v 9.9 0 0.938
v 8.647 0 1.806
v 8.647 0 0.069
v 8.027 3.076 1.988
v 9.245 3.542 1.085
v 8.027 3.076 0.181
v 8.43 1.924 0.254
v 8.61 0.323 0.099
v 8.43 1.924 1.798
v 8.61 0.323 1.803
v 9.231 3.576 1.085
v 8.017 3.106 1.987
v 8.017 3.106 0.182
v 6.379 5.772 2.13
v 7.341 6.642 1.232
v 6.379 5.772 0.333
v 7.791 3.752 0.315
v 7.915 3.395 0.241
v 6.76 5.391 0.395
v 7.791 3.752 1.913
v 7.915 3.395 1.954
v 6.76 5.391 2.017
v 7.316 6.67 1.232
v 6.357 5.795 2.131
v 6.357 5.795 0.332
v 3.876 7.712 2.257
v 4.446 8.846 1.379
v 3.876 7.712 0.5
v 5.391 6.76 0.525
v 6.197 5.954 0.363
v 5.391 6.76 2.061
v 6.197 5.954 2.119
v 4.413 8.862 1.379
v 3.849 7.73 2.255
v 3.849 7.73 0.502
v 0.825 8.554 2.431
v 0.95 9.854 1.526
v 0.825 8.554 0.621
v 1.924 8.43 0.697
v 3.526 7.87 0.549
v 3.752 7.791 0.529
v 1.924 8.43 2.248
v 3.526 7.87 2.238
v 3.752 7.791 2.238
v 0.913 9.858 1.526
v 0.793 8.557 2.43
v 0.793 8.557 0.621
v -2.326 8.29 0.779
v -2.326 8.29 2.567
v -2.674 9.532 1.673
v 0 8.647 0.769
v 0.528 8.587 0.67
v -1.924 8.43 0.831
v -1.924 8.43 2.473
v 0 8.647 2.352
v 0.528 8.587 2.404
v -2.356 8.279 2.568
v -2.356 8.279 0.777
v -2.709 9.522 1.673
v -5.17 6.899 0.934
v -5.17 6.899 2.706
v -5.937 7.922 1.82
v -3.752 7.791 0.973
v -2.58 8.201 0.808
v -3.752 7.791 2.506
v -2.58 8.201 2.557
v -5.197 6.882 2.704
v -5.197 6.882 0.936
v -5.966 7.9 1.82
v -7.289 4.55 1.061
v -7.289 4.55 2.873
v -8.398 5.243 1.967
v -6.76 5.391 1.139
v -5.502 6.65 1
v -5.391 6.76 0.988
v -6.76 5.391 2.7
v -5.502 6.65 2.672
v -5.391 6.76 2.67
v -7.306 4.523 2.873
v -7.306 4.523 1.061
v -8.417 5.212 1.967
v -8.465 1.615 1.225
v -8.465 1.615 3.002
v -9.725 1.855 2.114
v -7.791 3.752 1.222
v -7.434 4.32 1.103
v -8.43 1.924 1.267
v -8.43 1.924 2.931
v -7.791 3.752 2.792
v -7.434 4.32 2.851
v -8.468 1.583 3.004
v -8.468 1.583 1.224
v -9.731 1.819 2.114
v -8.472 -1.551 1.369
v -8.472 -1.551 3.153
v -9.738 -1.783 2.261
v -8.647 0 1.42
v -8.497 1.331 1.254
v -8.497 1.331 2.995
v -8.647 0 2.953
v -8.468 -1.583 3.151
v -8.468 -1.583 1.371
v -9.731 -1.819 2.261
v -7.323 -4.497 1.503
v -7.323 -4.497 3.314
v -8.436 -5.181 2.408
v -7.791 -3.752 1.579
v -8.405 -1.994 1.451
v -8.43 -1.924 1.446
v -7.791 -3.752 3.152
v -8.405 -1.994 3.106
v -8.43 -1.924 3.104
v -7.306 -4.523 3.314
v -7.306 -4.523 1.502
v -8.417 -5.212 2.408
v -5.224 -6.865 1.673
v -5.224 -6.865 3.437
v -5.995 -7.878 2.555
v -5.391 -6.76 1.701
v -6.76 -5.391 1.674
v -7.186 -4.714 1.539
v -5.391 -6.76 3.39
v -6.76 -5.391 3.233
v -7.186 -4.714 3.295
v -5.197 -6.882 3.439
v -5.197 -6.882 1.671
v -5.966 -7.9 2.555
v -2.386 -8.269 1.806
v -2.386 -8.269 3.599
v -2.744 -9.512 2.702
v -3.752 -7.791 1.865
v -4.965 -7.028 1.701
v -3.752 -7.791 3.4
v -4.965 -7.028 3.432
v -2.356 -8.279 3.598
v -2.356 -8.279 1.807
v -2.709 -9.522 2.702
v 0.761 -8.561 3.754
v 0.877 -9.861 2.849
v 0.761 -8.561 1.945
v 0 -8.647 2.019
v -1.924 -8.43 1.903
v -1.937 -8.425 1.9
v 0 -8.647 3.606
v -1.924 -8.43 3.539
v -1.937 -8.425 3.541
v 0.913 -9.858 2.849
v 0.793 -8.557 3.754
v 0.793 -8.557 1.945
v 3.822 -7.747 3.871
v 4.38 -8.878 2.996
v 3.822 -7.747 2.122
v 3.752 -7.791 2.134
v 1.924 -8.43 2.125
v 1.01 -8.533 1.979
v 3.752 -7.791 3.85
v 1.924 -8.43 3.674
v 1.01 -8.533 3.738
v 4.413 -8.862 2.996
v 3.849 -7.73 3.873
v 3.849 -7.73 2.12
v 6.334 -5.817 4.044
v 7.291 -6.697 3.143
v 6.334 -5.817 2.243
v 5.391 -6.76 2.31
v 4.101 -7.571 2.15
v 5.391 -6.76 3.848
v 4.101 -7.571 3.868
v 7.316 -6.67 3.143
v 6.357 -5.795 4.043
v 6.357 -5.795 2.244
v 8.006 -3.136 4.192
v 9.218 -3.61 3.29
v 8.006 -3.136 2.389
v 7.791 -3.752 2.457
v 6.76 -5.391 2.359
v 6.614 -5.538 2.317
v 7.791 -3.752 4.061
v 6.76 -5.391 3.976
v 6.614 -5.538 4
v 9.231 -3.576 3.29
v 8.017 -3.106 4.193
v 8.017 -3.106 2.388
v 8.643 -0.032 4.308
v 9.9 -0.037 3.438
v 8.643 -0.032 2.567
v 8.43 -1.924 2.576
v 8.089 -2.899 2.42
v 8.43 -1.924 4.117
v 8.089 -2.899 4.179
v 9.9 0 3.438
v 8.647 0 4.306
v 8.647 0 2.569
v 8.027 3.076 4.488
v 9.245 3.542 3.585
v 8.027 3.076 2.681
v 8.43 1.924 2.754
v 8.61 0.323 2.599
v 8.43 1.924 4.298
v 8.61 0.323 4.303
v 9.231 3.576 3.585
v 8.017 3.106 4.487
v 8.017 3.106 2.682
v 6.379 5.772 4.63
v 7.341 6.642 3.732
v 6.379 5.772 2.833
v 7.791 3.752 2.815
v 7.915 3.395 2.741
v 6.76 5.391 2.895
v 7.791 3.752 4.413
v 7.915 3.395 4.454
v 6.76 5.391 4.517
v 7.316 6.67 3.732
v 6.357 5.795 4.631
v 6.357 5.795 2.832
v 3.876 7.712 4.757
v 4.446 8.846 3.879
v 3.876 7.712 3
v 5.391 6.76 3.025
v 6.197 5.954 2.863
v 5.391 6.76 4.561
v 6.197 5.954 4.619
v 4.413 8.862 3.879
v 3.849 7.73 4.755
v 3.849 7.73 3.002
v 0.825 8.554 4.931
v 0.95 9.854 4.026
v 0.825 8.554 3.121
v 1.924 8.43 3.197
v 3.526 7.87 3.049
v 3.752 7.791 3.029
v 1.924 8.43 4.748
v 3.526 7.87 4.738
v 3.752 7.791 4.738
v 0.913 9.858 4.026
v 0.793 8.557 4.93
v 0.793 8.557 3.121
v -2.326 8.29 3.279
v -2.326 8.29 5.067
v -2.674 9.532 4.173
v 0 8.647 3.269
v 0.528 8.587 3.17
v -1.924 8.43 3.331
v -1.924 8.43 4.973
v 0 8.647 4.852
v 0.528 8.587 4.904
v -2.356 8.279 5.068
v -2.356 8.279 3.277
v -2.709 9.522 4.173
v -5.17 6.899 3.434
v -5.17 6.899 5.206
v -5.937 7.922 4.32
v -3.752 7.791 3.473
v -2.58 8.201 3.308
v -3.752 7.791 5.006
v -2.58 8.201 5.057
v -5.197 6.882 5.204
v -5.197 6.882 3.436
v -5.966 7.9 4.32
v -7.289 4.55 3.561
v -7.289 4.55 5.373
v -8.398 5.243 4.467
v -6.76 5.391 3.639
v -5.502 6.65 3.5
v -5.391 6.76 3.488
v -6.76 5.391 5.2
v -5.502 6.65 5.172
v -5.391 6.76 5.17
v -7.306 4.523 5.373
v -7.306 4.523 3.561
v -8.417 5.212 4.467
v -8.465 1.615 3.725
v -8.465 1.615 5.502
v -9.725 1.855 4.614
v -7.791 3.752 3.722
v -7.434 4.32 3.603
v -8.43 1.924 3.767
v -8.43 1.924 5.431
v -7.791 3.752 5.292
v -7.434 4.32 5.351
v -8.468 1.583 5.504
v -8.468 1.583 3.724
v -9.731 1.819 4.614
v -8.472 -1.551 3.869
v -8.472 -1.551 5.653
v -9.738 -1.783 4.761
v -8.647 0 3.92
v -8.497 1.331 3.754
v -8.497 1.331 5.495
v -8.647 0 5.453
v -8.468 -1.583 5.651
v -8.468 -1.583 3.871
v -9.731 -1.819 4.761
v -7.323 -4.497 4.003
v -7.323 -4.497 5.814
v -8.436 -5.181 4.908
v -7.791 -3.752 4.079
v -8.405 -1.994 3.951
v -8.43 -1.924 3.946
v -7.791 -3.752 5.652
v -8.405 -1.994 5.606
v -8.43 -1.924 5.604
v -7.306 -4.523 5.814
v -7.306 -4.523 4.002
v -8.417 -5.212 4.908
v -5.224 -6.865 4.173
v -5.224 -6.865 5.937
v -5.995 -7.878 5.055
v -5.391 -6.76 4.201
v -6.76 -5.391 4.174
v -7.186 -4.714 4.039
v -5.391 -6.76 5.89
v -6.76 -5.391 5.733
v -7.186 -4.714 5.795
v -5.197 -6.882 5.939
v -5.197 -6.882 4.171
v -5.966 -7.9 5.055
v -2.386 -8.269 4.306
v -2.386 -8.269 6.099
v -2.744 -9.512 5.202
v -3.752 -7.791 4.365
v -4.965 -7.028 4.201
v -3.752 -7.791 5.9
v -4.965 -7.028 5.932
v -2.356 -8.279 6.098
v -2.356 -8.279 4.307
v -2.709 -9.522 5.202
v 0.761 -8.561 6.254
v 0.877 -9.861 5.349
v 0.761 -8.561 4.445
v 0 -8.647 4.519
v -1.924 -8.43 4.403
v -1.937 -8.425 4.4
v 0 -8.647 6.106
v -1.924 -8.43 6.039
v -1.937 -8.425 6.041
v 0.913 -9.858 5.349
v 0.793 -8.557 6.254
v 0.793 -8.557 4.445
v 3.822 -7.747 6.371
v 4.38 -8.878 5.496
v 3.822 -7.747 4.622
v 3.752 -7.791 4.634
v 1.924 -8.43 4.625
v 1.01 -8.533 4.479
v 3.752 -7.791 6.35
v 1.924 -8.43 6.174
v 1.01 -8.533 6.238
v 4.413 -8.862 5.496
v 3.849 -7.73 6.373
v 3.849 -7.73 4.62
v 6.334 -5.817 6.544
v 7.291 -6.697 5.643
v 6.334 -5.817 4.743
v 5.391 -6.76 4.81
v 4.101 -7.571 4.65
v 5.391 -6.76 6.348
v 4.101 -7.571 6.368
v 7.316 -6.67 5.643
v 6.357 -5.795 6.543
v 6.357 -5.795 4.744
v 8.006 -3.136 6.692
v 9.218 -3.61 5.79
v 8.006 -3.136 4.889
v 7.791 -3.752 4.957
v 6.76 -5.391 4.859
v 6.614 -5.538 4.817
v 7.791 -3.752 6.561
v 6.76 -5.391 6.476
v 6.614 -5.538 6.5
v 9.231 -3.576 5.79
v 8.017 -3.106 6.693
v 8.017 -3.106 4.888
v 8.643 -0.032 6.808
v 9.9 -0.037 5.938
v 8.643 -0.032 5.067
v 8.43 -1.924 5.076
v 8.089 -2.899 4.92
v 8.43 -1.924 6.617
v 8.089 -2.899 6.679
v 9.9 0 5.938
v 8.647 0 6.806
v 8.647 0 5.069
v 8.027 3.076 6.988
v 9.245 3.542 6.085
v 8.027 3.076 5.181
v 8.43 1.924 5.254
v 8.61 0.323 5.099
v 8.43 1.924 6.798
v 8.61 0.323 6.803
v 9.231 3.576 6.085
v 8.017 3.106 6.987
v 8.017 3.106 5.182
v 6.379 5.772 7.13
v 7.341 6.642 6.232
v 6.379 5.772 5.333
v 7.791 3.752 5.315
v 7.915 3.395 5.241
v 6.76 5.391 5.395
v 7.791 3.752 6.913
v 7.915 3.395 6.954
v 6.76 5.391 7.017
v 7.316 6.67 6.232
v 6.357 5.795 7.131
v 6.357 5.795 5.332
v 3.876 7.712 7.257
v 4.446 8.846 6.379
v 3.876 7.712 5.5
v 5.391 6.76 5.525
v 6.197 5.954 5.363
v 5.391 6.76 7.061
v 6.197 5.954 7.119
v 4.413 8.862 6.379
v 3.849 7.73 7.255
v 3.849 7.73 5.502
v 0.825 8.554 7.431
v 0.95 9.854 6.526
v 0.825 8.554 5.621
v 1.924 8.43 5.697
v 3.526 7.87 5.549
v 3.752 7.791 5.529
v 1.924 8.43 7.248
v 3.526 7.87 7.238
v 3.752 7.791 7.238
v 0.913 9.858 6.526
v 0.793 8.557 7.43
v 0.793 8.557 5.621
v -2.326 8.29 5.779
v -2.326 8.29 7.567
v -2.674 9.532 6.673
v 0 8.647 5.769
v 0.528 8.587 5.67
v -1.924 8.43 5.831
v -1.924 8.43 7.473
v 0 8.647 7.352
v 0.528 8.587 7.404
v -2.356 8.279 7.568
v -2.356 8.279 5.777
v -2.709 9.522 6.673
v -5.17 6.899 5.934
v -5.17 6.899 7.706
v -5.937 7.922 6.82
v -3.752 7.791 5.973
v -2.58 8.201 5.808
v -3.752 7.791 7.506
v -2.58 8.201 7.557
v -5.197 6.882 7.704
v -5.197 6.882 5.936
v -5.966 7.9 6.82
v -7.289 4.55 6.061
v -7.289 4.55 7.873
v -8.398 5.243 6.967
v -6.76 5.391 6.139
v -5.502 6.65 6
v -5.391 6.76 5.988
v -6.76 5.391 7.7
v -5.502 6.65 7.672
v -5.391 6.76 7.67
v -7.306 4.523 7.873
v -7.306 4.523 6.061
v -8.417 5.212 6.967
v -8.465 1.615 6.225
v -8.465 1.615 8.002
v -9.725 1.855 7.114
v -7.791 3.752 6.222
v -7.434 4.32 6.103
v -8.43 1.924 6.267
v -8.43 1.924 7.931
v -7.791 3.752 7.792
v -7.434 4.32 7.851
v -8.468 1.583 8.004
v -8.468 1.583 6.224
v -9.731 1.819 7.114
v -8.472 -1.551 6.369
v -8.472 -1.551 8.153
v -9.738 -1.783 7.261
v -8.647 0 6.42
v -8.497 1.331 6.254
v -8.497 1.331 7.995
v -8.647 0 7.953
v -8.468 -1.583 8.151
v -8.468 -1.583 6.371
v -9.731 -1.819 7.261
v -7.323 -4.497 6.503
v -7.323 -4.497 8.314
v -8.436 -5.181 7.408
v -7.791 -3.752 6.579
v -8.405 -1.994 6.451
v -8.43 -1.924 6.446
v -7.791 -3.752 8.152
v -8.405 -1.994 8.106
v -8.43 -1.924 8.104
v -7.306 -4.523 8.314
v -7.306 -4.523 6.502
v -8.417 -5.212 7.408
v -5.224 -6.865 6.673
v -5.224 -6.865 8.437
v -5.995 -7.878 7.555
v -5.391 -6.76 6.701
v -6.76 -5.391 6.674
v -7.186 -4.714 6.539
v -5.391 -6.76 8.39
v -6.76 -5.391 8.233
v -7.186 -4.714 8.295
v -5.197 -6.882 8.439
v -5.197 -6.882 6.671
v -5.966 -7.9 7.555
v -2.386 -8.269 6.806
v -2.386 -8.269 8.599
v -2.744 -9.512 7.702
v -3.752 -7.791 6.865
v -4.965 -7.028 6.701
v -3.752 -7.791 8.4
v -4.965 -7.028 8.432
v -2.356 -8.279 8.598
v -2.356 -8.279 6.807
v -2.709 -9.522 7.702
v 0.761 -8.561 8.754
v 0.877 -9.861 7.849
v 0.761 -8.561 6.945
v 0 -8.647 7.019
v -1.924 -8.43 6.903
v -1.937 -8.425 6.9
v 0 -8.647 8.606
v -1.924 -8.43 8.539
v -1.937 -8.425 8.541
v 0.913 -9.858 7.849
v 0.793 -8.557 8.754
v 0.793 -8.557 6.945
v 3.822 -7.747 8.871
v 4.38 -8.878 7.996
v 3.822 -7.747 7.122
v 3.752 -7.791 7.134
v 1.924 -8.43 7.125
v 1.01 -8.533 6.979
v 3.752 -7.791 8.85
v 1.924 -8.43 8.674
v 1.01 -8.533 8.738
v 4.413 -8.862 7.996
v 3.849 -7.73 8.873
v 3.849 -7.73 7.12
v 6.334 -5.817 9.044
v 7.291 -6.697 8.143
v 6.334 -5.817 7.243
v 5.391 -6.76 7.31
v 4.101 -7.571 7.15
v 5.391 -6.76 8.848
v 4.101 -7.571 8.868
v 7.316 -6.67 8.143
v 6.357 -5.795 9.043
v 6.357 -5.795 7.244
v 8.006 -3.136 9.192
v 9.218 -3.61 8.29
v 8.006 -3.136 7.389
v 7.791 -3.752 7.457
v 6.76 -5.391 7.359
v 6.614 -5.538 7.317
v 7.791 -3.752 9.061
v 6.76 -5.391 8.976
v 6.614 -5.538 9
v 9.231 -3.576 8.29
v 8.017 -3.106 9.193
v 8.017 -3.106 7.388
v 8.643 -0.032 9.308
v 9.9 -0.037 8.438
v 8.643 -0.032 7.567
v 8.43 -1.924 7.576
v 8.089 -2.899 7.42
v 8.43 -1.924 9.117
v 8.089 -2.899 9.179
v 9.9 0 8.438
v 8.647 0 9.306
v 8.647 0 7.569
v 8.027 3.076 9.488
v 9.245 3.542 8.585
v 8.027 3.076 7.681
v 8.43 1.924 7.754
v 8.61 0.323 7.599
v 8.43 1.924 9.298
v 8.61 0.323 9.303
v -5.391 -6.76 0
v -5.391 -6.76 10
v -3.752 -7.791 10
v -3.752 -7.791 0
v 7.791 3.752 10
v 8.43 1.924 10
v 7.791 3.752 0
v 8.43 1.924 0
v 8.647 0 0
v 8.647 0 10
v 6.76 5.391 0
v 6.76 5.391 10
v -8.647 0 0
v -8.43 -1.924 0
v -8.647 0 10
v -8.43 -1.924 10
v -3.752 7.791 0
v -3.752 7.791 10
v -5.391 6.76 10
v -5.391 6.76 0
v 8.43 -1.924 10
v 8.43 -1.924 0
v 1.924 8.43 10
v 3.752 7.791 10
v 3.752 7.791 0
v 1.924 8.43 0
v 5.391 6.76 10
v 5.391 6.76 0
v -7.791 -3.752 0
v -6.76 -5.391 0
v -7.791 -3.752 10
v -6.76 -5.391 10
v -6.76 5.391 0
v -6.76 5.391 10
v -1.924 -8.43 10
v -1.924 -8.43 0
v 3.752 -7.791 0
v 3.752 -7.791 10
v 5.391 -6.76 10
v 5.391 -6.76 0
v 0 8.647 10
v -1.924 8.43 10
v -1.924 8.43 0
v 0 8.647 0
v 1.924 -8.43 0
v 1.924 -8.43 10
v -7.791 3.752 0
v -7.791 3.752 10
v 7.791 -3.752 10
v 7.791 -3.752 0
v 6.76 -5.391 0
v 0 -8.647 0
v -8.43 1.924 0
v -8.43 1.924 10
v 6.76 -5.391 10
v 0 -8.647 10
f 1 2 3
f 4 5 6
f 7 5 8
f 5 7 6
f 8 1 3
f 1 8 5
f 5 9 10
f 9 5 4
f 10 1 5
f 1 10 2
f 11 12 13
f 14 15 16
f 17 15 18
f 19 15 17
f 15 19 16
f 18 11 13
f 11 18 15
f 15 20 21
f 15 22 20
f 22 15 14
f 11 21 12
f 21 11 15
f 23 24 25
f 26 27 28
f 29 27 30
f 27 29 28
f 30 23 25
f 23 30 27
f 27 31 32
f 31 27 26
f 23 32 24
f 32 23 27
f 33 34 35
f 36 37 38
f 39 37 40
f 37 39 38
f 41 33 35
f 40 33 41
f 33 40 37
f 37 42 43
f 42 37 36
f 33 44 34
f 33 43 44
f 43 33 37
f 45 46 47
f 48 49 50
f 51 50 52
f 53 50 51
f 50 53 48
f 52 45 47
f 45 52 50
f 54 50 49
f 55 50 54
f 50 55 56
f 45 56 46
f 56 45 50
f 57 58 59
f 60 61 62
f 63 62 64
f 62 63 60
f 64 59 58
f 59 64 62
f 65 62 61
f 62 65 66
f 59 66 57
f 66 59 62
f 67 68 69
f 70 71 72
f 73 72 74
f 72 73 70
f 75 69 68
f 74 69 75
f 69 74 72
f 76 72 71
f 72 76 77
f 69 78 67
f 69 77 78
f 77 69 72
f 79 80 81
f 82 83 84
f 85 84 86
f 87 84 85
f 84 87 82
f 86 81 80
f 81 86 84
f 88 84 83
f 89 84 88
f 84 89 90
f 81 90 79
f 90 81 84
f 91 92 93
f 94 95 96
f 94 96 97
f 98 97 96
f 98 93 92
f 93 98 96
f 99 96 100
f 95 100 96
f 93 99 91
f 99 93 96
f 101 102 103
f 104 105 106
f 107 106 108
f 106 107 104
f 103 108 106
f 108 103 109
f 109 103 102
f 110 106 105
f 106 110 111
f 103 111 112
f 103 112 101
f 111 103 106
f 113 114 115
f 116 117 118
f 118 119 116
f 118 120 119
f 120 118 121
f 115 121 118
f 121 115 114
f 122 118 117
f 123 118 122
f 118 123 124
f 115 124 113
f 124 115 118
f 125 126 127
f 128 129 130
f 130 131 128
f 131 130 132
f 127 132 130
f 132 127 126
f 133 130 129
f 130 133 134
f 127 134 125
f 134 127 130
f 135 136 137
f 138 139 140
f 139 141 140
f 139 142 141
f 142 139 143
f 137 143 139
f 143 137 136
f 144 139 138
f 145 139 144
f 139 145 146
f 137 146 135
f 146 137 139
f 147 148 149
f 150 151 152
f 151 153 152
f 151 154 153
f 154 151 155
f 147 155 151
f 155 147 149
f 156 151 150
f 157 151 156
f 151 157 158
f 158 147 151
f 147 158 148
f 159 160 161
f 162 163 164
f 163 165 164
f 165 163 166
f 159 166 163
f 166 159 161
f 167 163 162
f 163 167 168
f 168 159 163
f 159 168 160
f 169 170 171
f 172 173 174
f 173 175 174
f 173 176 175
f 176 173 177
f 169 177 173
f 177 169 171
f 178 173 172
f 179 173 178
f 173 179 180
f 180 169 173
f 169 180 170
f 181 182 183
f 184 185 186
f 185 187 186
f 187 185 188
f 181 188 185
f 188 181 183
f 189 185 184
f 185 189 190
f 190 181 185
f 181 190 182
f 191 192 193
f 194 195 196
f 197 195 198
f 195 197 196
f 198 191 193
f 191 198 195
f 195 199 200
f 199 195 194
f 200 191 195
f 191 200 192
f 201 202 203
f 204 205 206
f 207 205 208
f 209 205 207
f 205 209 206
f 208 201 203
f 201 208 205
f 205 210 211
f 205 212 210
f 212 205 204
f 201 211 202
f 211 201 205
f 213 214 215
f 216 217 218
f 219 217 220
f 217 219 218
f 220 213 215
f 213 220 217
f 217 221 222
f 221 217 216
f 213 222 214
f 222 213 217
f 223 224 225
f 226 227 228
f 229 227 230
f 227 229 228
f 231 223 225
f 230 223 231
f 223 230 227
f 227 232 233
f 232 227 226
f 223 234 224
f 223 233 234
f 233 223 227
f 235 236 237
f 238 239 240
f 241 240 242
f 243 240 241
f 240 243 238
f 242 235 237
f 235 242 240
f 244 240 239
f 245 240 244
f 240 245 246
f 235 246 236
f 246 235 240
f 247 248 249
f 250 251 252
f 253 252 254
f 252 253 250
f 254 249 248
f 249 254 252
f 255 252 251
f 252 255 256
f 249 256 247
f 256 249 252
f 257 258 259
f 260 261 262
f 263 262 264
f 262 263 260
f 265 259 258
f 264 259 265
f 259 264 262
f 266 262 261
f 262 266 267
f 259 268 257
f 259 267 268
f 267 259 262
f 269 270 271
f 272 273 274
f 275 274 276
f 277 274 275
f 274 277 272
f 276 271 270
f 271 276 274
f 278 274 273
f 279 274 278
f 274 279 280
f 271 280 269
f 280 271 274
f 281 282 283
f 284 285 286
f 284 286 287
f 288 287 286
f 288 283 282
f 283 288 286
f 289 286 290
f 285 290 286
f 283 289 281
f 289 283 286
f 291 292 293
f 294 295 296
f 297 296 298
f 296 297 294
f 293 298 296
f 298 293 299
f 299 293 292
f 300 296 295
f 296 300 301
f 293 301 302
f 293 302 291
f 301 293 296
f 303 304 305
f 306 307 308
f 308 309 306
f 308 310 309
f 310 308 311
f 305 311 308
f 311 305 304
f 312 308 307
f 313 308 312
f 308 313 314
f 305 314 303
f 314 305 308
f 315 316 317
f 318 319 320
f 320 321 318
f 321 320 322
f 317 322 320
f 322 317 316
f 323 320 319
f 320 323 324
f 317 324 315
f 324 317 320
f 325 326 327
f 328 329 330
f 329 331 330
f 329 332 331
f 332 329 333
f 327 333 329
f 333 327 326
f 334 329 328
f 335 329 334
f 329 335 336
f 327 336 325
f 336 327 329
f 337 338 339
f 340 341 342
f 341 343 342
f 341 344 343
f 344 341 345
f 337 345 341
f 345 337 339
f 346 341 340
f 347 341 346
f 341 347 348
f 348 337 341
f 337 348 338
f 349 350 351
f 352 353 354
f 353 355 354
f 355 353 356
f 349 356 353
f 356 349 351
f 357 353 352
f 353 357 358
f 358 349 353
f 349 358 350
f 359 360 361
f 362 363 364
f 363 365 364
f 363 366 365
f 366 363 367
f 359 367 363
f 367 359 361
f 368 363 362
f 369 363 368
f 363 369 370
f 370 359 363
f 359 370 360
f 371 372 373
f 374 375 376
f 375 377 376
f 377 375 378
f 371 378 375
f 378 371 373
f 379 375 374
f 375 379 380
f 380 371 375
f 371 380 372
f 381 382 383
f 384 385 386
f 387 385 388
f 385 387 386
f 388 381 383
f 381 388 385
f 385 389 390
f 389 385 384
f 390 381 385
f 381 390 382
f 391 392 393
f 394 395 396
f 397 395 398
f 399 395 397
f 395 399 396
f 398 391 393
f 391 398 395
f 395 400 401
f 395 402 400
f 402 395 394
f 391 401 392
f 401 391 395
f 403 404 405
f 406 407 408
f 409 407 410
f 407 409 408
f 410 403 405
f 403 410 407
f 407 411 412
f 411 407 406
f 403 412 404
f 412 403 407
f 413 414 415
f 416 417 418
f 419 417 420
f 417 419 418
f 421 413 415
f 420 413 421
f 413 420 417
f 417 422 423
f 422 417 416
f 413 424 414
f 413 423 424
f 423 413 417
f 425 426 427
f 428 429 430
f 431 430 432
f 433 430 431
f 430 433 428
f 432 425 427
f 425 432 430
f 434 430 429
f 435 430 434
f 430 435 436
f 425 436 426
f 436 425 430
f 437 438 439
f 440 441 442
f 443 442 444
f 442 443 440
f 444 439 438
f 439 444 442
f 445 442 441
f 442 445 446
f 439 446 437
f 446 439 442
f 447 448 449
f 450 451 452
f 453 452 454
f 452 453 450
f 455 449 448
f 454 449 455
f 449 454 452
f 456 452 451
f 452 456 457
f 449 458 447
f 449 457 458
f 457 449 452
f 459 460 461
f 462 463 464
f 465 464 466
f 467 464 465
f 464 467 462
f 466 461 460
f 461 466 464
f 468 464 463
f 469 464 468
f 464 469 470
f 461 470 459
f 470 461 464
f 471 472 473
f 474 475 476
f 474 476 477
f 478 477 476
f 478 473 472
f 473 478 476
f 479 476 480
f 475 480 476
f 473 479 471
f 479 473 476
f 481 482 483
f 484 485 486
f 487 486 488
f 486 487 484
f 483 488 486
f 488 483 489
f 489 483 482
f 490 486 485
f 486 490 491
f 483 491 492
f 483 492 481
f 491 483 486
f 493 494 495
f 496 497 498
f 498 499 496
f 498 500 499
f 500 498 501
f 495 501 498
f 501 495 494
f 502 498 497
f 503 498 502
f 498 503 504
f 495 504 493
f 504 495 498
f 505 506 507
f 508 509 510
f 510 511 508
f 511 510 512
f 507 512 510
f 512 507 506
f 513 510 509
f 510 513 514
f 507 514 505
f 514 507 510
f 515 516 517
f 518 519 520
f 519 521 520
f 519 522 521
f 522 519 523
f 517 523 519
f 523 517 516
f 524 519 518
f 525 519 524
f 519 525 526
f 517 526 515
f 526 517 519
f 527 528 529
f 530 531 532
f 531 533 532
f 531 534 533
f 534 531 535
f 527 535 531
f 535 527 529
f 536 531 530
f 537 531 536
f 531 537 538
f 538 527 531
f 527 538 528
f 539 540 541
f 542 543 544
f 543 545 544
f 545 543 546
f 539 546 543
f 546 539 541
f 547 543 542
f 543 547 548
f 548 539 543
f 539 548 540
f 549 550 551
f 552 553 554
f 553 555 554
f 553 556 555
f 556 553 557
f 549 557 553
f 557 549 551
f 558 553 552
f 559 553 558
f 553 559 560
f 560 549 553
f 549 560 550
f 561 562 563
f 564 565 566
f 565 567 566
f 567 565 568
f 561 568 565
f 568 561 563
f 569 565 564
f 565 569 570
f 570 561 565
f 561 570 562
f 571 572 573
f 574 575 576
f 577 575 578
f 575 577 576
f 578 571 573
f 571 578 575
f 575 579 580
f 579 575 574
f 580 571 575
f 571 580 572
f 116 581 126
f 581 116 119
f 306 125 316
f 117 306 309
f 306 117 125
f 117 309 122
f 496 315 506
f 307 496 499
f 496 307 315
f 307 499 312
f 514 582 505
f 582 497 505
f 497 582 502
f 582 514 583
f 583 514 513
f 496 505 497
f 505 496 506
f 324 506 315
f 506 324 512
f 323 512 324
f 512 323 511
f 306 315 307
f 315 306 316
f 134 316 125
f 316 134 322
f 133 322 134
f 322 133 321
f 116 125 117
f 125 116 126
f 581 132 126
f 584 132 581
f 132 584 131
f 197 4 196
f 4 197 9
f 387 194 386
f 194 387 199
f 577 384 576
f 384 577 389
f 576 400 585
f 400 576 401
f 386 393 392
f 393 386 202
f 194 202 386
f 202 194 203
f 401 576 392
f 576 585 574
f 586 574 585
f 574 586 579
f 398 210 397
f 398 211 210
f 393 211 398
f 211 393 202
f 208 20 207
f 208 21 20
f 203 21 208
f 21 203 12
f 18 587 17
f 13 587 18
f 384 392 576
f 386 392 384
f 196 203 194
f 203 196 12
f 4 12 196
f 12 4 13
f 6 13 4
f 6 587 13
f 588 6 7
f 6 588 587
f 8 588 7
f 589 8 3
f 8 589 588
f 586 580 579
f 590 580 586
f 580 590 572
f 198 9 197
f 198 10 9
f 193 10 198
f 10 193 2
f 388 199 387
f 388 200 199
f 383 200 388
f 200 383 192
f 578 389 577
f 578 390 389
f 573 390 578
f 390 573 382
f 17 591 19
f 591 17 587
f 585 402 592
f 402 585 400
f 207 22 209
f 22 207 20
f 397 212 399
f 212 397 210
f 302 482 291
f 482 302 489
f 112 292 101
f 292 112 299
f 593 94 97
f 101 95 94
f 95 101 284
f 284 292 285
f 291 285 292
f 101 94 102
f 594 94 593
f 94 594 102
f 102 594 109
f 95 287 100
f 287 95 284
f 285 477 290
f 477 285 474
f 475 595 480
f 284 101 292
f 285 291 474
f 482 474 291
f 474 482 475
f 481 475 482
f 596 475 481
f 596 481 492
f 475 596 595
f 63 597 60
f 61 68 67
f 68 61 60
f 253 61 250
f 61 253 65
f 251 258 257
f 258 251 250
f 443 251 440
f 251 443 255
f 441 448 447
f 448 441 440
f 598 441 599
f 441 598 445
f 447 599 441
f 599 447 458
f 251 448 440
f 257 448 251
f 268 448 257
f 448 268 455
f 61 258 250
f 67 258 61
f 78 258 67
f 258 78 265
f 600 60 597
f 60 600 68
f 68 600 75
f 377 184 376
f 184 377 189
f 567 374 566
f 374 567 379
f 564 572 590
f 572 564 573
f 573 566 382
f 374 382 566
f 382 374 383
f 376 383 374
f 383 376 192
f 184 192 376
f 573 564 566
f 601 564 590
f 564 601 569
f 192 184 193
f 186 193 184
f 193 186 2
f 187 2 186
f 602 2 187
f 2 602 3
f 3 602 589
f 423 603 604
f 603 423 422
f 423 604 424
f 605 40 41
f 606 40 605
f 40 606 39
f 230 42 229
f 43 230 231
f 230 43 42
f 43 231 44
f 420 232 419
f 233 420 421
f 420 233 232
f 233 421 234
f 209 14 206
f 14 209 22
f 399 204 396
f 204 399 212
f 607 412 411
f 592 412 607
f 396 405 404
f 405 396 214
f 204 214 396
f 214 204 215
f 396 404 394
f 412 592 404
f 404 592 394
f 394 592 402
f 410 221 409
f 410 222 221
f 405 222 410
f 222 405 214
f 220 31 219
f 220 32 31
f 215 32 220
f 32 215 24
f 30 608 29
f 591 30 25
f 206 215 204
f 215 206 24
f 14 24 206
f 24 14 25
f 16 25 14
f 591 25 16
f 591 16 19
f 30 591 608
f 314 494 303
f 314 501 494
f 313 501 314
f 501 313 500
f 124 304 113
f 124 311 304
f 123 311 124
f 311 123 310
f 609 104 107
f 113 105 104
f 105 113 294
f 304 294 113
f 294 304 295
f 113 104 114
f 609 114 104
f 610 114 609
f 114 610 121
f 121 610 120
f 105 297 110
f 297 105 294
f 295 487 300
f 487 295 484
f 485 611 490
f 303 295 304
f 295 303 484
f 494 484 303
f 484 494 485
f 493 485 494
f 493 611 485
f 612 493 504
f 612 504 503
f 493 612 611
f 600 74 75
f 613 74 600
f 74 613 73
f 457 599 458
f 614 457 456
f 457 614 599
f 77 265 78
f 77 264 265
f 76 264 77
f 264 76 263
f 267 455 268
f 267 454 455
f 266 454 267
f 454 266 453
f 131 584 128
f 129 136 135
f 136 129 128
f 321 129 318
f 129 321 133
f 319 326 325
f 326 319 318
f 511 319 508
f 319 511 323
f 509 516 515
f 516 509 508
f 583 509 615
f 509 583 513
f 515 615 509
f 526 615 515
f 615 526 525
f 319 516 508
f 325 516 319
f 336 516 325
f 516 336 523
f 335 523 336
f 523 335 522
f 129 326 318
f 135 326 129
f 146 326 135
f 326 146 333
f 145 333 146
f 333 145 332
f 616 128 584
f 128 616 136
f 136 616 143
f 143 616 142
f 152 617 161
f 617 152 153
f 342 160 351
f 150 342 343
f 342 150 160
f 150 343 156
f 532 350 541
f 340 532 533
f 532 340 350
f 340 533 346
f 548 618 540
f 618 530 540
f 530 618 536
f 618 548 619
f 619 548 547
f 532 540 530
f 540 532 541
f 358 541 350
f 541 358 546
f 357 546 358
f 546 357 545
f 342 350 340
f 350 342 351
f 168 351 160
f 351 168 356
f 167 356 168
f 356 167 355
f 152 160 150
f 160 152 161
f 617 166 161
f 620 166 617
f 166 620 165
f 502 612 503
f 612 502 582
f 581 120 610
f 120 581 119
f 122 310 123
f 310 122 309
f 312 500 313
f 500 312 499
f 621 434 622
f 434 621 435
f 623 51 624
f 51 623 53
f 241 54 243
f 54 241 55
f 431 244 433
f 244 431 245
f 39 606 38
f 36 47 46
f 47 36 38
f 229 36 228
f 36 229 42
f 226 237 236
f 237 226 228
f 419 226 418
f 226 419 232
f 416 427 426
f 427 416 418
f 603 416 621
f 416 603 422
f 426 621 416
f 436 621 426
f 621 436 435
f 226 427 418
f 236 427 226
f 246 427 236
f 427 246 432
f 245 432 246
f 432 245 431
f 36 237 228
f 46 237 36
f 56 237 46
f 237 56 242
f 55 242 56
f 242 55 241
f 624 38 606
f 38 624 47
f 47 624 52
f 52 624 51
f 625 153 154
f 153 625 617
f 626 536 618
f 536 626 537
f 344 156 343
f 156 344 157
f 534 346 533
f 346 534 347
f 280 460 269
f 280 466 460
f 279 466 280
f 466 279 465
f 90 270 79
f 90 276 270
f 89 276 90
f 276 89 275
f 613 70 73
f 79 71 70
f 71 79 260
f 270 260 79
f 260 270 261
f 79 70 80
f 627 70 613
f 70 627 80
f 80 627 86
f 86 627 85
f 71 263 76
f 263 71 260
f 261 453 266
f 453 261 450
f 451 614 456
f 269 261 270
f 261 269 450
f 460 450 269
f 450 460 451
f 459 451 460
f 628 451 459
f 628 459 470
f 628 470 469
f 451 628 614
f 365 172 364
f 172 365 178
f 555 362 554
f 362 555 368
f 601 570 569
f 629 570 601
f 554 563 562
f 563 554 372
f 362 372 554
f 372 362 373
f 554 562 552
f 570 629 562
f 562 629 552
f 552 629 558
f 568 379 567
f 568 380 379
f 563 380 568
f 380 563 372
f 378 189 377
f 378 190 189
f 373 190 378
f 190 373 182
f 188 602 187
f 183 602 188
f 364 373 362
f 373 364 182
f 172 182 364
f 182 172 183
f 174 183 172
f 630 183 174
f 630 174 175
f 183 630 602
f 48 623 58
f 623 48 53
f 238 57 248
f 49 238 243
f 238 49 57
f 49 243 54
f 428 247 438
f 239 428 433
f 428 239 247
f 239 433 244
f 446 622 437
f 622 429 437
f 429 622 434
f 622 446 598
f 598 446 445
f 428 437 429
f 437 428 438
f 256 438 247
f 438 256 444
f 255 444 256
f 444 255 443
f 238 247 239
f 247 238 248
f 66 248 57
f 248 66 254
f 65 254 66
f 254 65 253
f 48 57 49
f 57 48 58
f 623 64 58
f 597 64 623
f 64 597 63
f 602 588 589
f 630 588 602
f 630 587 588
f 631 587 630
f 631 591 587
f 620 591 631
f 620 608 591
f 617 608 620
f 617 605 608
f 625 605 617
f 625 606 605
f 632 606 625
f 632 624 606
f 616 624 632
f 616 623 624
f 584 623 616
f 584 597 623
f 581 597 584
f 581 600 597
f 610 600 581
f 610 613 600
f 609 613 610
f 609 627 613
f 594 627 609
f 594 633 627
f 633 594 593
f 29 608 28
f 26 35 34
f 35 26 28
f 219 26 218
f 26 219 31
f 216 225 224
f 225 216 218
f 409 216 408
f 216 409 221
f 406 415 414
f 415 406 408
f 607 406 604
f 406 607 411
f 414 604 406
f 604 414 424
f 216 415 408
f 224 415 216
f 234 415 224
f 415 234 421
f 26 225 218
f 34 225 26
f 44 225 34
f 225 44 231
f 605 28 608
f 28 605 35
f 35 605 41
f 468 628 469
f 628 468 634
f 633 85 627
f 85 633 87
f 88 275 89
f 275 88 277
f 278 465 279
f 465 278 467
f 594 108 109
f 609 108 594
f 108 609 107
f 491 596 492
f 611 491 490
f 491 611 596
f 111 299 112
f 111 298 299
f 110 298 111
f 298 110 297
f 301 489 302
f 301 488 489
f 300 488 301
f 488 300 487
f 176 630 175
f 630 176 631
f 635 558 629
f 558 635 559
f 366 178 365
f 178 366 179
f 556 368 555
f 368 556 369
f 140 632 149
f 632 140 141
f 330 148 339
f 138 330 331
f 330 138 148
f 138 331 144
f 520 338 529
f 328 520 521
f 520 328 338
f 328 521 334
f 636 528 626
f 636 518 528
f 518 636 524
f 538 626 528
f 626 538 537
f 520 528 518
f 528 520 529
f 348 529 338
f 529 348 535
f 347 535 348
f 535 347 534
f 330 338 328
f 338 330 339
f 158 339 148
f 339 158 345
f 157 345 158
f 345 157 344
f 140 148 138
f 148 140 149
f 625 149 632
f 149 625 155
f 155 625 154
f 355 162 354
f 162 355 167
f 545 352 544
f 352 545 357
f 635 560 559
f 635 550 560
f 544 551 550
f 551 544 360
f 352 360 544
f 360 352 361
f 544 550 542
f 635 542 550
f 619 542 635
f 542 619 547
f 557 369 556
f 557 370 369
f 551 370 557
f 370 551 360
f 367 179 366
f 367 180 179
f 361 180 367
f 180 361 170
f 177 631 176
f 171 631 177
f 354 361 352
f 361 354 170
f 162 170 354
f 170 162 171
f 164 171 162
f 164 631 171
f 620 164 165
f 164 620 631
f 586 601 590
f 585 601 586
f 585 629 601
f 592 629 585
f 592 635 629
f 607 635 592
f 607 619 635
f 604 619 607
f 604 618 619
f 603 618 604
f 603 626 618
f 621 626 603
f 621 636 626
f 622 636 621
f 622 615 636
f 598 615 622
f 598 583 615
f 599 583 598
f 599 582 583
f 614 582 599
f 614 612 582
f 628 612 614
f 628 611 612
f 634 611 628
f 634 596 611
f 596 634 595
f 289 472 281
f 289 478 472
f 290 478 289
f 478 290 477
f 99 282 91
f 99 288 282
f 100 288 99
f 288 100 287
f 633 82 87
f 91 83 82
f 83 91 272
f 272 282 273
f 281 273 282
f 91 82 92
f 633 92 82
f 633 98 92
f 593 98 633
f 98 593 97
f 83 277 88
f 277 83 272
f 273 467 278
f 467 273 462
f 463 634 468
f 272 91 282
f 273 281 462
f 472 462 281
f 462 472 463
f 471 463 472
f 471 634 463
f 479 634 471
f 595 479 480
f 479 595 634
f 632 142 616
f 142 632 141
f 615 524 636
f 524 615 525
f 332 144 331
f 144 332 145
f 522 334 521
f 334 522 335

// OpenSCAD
// ISO Metric Thread Implementation
// Trevor Moseley
// 23/08/2012
// edited by jonnyhoeven@gmail.com for "Gardena to Showerhose connector"
// http://www.thingiverse.com/thing:106272

// For thread dimensions see
//   http://en.wikipedia.org/wiki/File:ISO_and_UTS_Thread_Dimensions.svg

//hex_nut(6);
//hex_nut(8);
//hex_nut(20);

//hex_bolt(6,12);
//hex_bolt(8,16);
//hex_bolt(10,16);
//hex_bolt(12,24);

thread_out(20,10);

defQ = 17;

// function for thread quality
function get_thr_qual(dia) = lookup(dia, [
[5,10],[6,12],[7,14],[8,16],[10,20],[12,12],[14,28],[16,32],[18,36],[20,40],[22,44],[24,48],[27,54],[30,60],[33,66],[36,72],[39,78],[42,84],[45,90],[48,96],[52,104],[56,112],[60,120],[64,128],[78,156]]);

// function for shaft quality
function get_sh_qual(dia) = lookup(dia, [
[5,10],[6,12],[7,14],[8,16],[10,20],[12,24],[14,28],[16,32],[18,36],[20,40],[22,44],[24,48],[27,54],[30,60],[33,66],[36,72],[39,78],[42,84],[45,90],[48,96],[52,104],[56,112],[60,120],[64,128],[78,156]]);

module hex_nut(dia)
{
	$fn = get_sh_qual(dia);
	thr = get_thr_qual(dia);
	hi = 15; //hex_nut_hi(dia);
	difference()
	{
		cylinder(r = hex_nut_dia(dia)/2,h = hi, $fn=32);
		translate([0,0,-0.1])	cylinder(r = dia/2, h =hi + 0.2);
	}
	translate([0,0,0.1])	thread_in(dia,hi-0.2,thr);
}

module hex_bolt(dia,hi)
{
	$fn = get_sh_qual(dia);
	thr = get_thr_qual(dia);
	hhi = hex_bolt_hi(dia);
	cylinder(r = hex_bolt_dia(dia)/2,h = hhi, $fn=6);
	translate([0,0,hhi-0.1])	thread_out(dia,hi+0.1,thr);
}

// function for thread pitch
function get_coarse_pitch(dia) = lookup(dia, [
[1,0.25],[1.2,0.25],[1.4,0.3],[1.6,0.35],[1.8,0.35],[2,0.4],[2.5,0.45],[3,0.5],[3.5,0.6],[4,0.7],[5,0.8],[6,1],[7,1],[8,1.25],[10,1.5],[12,1.75],[14,2],[16,2],[18,2.5],[20,2.5],[22,2.5],[24,3],[27,3],[30,3.5],[33,3.5],[36,4],[39,4],[42,4.5],[45,4.5],[48,5],[52,5],[56,5.5],[60,5.5],[64,6],[78,5]]);

// function for hex nut diameter from thread size
function hex_nut_dia(dia) = lookup(dia, [
[3,6.4],[4,8.1],[5,9.2],[6,11.5],[8,16.0],[10,19.6],[12,22.1],[16,27.7],[20,34.6],[24,41.6],[30,53.1],[36,63.5]]);
// function for hex nut height from thread size
function hex_nut_hi(dia) = lookup(dia, [
[3,2.4],[4,3.2],[5,4],[6,3],[8,5],[10,5],[12,10],[16,13],[20,16],[24,19],[30,24],[36,29]]);

// function for hex bolt head diameter from thread size
function hex_bolt_dia(dia) = lookup(dia, [
[3,6.4],[4,8.1],[5,9.2],[6,11.5],[8,14.0],[10,16],[12,22.1],[16,27.7],[20,34.6],[24,41.6],[30,53.1],[36,63.5]]);
// function for hex bolt head height from thread size
function hex_bolt_hi(dia) = lookup(dia, [
[3,2.4],[4,3.2],[5,4],[6,3.5],[8,4.5],[10,5],[12,10],[16,13],[20,16],[24,19],[30,24],[36,29]]);

module thread_out(dia,hi,thr=defQ)
{
	p = get_coarse_pitch(dia);
	h = (cos(30)*p)/8;
	Rmin = (dia/2) - (5*h);	// as wiki Dmin
	s = 360/thr;
	t = (hi-p)/p;			// number of turns
	n = t*thr;				// number of segments
	//echo(str("dia=",dia," hi=",hi," p=",p," h=",h," Rmin=",Rmin," s=",s));
	cylinder(r = Rmin, h = hi);
	for(sg=[0:n])
		th_out_pt(Rmin-0.1,p,s,sg,thr,h,(hi-p)/n);
}

module th_out_pt(rt,p,s,sg,thr,h,sh)
// rt = radius of thread (nearest centre)
// p = pitch
// s = segment length (degrees)
// sg = segment number
// thr = segments in circumference
// h = ISO h of thread / 8
// sh = segment height (z)
{
	as = (sg % thr) * s;			// angle to start of seg
	ae = as + s  - (s/100);		// angle to end of seg (with overlap)
	z = sh*sg;

	cas=cos(as);
	sas=sin(as);
	cae=cos(ae);
	sae=sin(ae);
	rtp=rt+(5*h);

	casrt=cas*rt;
	sasrt=sas*rt;
	caert=cae*rt;
	saert=sae*rt;

	//   1,4
	//   |\
	//   |  \  2,5
 	//   |  / 
	//   |/
	//   0,3
	//  view from front (x & z) extruded in y by sg
	//  
	//echo(str("as=",as,", ae=",ae," z=",z));
	polyhedron(
		points = [
			[casrt,sasrt,z],					// 0
			[casrt,sasrt,z+(3/4*p)],			// 1
			[cas*rtp,sas*rtp,z+(3/8*p)],		// 2
			[caert,saert,z+sh],				// 3
			[caert,saert,z+(3/4*p)+sh],		// 4
			[cae*rtp,sae*rtp,z+sh+(3/8*p)]],	// 5
		triangles = [
			[0,1,2],			// near face
			[3,5,4],			// far face
			[0,3,4],[0,4,1],	// left face
			[0,5,3],[0,2,5],	// bottom face
			[1,4,5],[1,5,2]]);	// top face
}

module thread_in(dia,hi,thr=defQ)
{
	p = get_coarse_pitch(dia);
	h = (cos(30)*p)/8;
	Rmin = (dia/2) - (5*h);	// as wiki Dmin
	s = 360/thr;
	t = (hi-p)/p;			// number of turns
	n = t*thr;				// number of segments
	//echo(str("dia=",dia," hi=",hi," p=",p," h=",h," Rmin=",Rmin," s=",s));
	difference()
	{
		cylinder(r = (dia/2)+0.5,h = hi);
		translate([0,0,-1]) cylinder(r = (dia/2)+0.1, h = hi+2);
	}
	for(sg=[0:n])
		th_in_pt(Rmin+0.2,p,s,sg,thr,h,(hi-p)/n);
}

module th_in_pt(rt,p,s,sg,thr,h,sh)
// rt = radius of thread (nearest centre)
// p = pitch
// s = segment length (degrees)
// sg = segment number
// thr = segments in circumference
// h = ISO h of thread / 8
// sh = segment height (z)
{
//	as = 360 - (((sg % thr) * s) - 180);	// angle to start of seg
//	ae = as - s + (s/100);		// angle to end of seg (with overlap)
	as = ((sg % thr) * s - 180);	// angle to start of seg
	ae = as + s -(s/100);		// angle to end of seg (with overlap)
	z = sh*sg;

	cas=cos(as);
	sas=sin(as);
	cae=cos(ae);
	sae=sin(ae);
	rtp=rt+(5*h);

	casrt=cas*rt;
	casrtp=cas*rtp;
	sasrt=sas*rt;
	sasrtp=sas*rtp;
	caert=cae*rt;
	caertp=cae*rtp;
	saert=sae*rt;
	saertp=sae*rtp;

	//         2,5
	//          /|
	//  1,4 /  | 
 	//        \  |
	//          \|
	//         0,3
	//  view from front (x & z) extruded in y by sg
	//  
	polyhedron(
		points = [
			[casrtp,sasrtp,z],				//0
			[casrt,sasrt,z+(3/8*p)],			//1
			[casrtp,sasrtp,z+(3/4*p)],		//2
			[caertp,saertp,z+sh],			//3
			[caert,saert,z+(3/8*p)+sh],		//4
			[caertp,saertp,z+(3/4*p)+sh]],	//5
		triangles = [
			[0,1,2],			// near face
			[3,5,4],			// far face
			[0,3,4],[0,4,1],	// left face
			[0,5,3],[0,2,5],	// bottom face
			[1,4,5],[1,5,2]]);	// top face
}
